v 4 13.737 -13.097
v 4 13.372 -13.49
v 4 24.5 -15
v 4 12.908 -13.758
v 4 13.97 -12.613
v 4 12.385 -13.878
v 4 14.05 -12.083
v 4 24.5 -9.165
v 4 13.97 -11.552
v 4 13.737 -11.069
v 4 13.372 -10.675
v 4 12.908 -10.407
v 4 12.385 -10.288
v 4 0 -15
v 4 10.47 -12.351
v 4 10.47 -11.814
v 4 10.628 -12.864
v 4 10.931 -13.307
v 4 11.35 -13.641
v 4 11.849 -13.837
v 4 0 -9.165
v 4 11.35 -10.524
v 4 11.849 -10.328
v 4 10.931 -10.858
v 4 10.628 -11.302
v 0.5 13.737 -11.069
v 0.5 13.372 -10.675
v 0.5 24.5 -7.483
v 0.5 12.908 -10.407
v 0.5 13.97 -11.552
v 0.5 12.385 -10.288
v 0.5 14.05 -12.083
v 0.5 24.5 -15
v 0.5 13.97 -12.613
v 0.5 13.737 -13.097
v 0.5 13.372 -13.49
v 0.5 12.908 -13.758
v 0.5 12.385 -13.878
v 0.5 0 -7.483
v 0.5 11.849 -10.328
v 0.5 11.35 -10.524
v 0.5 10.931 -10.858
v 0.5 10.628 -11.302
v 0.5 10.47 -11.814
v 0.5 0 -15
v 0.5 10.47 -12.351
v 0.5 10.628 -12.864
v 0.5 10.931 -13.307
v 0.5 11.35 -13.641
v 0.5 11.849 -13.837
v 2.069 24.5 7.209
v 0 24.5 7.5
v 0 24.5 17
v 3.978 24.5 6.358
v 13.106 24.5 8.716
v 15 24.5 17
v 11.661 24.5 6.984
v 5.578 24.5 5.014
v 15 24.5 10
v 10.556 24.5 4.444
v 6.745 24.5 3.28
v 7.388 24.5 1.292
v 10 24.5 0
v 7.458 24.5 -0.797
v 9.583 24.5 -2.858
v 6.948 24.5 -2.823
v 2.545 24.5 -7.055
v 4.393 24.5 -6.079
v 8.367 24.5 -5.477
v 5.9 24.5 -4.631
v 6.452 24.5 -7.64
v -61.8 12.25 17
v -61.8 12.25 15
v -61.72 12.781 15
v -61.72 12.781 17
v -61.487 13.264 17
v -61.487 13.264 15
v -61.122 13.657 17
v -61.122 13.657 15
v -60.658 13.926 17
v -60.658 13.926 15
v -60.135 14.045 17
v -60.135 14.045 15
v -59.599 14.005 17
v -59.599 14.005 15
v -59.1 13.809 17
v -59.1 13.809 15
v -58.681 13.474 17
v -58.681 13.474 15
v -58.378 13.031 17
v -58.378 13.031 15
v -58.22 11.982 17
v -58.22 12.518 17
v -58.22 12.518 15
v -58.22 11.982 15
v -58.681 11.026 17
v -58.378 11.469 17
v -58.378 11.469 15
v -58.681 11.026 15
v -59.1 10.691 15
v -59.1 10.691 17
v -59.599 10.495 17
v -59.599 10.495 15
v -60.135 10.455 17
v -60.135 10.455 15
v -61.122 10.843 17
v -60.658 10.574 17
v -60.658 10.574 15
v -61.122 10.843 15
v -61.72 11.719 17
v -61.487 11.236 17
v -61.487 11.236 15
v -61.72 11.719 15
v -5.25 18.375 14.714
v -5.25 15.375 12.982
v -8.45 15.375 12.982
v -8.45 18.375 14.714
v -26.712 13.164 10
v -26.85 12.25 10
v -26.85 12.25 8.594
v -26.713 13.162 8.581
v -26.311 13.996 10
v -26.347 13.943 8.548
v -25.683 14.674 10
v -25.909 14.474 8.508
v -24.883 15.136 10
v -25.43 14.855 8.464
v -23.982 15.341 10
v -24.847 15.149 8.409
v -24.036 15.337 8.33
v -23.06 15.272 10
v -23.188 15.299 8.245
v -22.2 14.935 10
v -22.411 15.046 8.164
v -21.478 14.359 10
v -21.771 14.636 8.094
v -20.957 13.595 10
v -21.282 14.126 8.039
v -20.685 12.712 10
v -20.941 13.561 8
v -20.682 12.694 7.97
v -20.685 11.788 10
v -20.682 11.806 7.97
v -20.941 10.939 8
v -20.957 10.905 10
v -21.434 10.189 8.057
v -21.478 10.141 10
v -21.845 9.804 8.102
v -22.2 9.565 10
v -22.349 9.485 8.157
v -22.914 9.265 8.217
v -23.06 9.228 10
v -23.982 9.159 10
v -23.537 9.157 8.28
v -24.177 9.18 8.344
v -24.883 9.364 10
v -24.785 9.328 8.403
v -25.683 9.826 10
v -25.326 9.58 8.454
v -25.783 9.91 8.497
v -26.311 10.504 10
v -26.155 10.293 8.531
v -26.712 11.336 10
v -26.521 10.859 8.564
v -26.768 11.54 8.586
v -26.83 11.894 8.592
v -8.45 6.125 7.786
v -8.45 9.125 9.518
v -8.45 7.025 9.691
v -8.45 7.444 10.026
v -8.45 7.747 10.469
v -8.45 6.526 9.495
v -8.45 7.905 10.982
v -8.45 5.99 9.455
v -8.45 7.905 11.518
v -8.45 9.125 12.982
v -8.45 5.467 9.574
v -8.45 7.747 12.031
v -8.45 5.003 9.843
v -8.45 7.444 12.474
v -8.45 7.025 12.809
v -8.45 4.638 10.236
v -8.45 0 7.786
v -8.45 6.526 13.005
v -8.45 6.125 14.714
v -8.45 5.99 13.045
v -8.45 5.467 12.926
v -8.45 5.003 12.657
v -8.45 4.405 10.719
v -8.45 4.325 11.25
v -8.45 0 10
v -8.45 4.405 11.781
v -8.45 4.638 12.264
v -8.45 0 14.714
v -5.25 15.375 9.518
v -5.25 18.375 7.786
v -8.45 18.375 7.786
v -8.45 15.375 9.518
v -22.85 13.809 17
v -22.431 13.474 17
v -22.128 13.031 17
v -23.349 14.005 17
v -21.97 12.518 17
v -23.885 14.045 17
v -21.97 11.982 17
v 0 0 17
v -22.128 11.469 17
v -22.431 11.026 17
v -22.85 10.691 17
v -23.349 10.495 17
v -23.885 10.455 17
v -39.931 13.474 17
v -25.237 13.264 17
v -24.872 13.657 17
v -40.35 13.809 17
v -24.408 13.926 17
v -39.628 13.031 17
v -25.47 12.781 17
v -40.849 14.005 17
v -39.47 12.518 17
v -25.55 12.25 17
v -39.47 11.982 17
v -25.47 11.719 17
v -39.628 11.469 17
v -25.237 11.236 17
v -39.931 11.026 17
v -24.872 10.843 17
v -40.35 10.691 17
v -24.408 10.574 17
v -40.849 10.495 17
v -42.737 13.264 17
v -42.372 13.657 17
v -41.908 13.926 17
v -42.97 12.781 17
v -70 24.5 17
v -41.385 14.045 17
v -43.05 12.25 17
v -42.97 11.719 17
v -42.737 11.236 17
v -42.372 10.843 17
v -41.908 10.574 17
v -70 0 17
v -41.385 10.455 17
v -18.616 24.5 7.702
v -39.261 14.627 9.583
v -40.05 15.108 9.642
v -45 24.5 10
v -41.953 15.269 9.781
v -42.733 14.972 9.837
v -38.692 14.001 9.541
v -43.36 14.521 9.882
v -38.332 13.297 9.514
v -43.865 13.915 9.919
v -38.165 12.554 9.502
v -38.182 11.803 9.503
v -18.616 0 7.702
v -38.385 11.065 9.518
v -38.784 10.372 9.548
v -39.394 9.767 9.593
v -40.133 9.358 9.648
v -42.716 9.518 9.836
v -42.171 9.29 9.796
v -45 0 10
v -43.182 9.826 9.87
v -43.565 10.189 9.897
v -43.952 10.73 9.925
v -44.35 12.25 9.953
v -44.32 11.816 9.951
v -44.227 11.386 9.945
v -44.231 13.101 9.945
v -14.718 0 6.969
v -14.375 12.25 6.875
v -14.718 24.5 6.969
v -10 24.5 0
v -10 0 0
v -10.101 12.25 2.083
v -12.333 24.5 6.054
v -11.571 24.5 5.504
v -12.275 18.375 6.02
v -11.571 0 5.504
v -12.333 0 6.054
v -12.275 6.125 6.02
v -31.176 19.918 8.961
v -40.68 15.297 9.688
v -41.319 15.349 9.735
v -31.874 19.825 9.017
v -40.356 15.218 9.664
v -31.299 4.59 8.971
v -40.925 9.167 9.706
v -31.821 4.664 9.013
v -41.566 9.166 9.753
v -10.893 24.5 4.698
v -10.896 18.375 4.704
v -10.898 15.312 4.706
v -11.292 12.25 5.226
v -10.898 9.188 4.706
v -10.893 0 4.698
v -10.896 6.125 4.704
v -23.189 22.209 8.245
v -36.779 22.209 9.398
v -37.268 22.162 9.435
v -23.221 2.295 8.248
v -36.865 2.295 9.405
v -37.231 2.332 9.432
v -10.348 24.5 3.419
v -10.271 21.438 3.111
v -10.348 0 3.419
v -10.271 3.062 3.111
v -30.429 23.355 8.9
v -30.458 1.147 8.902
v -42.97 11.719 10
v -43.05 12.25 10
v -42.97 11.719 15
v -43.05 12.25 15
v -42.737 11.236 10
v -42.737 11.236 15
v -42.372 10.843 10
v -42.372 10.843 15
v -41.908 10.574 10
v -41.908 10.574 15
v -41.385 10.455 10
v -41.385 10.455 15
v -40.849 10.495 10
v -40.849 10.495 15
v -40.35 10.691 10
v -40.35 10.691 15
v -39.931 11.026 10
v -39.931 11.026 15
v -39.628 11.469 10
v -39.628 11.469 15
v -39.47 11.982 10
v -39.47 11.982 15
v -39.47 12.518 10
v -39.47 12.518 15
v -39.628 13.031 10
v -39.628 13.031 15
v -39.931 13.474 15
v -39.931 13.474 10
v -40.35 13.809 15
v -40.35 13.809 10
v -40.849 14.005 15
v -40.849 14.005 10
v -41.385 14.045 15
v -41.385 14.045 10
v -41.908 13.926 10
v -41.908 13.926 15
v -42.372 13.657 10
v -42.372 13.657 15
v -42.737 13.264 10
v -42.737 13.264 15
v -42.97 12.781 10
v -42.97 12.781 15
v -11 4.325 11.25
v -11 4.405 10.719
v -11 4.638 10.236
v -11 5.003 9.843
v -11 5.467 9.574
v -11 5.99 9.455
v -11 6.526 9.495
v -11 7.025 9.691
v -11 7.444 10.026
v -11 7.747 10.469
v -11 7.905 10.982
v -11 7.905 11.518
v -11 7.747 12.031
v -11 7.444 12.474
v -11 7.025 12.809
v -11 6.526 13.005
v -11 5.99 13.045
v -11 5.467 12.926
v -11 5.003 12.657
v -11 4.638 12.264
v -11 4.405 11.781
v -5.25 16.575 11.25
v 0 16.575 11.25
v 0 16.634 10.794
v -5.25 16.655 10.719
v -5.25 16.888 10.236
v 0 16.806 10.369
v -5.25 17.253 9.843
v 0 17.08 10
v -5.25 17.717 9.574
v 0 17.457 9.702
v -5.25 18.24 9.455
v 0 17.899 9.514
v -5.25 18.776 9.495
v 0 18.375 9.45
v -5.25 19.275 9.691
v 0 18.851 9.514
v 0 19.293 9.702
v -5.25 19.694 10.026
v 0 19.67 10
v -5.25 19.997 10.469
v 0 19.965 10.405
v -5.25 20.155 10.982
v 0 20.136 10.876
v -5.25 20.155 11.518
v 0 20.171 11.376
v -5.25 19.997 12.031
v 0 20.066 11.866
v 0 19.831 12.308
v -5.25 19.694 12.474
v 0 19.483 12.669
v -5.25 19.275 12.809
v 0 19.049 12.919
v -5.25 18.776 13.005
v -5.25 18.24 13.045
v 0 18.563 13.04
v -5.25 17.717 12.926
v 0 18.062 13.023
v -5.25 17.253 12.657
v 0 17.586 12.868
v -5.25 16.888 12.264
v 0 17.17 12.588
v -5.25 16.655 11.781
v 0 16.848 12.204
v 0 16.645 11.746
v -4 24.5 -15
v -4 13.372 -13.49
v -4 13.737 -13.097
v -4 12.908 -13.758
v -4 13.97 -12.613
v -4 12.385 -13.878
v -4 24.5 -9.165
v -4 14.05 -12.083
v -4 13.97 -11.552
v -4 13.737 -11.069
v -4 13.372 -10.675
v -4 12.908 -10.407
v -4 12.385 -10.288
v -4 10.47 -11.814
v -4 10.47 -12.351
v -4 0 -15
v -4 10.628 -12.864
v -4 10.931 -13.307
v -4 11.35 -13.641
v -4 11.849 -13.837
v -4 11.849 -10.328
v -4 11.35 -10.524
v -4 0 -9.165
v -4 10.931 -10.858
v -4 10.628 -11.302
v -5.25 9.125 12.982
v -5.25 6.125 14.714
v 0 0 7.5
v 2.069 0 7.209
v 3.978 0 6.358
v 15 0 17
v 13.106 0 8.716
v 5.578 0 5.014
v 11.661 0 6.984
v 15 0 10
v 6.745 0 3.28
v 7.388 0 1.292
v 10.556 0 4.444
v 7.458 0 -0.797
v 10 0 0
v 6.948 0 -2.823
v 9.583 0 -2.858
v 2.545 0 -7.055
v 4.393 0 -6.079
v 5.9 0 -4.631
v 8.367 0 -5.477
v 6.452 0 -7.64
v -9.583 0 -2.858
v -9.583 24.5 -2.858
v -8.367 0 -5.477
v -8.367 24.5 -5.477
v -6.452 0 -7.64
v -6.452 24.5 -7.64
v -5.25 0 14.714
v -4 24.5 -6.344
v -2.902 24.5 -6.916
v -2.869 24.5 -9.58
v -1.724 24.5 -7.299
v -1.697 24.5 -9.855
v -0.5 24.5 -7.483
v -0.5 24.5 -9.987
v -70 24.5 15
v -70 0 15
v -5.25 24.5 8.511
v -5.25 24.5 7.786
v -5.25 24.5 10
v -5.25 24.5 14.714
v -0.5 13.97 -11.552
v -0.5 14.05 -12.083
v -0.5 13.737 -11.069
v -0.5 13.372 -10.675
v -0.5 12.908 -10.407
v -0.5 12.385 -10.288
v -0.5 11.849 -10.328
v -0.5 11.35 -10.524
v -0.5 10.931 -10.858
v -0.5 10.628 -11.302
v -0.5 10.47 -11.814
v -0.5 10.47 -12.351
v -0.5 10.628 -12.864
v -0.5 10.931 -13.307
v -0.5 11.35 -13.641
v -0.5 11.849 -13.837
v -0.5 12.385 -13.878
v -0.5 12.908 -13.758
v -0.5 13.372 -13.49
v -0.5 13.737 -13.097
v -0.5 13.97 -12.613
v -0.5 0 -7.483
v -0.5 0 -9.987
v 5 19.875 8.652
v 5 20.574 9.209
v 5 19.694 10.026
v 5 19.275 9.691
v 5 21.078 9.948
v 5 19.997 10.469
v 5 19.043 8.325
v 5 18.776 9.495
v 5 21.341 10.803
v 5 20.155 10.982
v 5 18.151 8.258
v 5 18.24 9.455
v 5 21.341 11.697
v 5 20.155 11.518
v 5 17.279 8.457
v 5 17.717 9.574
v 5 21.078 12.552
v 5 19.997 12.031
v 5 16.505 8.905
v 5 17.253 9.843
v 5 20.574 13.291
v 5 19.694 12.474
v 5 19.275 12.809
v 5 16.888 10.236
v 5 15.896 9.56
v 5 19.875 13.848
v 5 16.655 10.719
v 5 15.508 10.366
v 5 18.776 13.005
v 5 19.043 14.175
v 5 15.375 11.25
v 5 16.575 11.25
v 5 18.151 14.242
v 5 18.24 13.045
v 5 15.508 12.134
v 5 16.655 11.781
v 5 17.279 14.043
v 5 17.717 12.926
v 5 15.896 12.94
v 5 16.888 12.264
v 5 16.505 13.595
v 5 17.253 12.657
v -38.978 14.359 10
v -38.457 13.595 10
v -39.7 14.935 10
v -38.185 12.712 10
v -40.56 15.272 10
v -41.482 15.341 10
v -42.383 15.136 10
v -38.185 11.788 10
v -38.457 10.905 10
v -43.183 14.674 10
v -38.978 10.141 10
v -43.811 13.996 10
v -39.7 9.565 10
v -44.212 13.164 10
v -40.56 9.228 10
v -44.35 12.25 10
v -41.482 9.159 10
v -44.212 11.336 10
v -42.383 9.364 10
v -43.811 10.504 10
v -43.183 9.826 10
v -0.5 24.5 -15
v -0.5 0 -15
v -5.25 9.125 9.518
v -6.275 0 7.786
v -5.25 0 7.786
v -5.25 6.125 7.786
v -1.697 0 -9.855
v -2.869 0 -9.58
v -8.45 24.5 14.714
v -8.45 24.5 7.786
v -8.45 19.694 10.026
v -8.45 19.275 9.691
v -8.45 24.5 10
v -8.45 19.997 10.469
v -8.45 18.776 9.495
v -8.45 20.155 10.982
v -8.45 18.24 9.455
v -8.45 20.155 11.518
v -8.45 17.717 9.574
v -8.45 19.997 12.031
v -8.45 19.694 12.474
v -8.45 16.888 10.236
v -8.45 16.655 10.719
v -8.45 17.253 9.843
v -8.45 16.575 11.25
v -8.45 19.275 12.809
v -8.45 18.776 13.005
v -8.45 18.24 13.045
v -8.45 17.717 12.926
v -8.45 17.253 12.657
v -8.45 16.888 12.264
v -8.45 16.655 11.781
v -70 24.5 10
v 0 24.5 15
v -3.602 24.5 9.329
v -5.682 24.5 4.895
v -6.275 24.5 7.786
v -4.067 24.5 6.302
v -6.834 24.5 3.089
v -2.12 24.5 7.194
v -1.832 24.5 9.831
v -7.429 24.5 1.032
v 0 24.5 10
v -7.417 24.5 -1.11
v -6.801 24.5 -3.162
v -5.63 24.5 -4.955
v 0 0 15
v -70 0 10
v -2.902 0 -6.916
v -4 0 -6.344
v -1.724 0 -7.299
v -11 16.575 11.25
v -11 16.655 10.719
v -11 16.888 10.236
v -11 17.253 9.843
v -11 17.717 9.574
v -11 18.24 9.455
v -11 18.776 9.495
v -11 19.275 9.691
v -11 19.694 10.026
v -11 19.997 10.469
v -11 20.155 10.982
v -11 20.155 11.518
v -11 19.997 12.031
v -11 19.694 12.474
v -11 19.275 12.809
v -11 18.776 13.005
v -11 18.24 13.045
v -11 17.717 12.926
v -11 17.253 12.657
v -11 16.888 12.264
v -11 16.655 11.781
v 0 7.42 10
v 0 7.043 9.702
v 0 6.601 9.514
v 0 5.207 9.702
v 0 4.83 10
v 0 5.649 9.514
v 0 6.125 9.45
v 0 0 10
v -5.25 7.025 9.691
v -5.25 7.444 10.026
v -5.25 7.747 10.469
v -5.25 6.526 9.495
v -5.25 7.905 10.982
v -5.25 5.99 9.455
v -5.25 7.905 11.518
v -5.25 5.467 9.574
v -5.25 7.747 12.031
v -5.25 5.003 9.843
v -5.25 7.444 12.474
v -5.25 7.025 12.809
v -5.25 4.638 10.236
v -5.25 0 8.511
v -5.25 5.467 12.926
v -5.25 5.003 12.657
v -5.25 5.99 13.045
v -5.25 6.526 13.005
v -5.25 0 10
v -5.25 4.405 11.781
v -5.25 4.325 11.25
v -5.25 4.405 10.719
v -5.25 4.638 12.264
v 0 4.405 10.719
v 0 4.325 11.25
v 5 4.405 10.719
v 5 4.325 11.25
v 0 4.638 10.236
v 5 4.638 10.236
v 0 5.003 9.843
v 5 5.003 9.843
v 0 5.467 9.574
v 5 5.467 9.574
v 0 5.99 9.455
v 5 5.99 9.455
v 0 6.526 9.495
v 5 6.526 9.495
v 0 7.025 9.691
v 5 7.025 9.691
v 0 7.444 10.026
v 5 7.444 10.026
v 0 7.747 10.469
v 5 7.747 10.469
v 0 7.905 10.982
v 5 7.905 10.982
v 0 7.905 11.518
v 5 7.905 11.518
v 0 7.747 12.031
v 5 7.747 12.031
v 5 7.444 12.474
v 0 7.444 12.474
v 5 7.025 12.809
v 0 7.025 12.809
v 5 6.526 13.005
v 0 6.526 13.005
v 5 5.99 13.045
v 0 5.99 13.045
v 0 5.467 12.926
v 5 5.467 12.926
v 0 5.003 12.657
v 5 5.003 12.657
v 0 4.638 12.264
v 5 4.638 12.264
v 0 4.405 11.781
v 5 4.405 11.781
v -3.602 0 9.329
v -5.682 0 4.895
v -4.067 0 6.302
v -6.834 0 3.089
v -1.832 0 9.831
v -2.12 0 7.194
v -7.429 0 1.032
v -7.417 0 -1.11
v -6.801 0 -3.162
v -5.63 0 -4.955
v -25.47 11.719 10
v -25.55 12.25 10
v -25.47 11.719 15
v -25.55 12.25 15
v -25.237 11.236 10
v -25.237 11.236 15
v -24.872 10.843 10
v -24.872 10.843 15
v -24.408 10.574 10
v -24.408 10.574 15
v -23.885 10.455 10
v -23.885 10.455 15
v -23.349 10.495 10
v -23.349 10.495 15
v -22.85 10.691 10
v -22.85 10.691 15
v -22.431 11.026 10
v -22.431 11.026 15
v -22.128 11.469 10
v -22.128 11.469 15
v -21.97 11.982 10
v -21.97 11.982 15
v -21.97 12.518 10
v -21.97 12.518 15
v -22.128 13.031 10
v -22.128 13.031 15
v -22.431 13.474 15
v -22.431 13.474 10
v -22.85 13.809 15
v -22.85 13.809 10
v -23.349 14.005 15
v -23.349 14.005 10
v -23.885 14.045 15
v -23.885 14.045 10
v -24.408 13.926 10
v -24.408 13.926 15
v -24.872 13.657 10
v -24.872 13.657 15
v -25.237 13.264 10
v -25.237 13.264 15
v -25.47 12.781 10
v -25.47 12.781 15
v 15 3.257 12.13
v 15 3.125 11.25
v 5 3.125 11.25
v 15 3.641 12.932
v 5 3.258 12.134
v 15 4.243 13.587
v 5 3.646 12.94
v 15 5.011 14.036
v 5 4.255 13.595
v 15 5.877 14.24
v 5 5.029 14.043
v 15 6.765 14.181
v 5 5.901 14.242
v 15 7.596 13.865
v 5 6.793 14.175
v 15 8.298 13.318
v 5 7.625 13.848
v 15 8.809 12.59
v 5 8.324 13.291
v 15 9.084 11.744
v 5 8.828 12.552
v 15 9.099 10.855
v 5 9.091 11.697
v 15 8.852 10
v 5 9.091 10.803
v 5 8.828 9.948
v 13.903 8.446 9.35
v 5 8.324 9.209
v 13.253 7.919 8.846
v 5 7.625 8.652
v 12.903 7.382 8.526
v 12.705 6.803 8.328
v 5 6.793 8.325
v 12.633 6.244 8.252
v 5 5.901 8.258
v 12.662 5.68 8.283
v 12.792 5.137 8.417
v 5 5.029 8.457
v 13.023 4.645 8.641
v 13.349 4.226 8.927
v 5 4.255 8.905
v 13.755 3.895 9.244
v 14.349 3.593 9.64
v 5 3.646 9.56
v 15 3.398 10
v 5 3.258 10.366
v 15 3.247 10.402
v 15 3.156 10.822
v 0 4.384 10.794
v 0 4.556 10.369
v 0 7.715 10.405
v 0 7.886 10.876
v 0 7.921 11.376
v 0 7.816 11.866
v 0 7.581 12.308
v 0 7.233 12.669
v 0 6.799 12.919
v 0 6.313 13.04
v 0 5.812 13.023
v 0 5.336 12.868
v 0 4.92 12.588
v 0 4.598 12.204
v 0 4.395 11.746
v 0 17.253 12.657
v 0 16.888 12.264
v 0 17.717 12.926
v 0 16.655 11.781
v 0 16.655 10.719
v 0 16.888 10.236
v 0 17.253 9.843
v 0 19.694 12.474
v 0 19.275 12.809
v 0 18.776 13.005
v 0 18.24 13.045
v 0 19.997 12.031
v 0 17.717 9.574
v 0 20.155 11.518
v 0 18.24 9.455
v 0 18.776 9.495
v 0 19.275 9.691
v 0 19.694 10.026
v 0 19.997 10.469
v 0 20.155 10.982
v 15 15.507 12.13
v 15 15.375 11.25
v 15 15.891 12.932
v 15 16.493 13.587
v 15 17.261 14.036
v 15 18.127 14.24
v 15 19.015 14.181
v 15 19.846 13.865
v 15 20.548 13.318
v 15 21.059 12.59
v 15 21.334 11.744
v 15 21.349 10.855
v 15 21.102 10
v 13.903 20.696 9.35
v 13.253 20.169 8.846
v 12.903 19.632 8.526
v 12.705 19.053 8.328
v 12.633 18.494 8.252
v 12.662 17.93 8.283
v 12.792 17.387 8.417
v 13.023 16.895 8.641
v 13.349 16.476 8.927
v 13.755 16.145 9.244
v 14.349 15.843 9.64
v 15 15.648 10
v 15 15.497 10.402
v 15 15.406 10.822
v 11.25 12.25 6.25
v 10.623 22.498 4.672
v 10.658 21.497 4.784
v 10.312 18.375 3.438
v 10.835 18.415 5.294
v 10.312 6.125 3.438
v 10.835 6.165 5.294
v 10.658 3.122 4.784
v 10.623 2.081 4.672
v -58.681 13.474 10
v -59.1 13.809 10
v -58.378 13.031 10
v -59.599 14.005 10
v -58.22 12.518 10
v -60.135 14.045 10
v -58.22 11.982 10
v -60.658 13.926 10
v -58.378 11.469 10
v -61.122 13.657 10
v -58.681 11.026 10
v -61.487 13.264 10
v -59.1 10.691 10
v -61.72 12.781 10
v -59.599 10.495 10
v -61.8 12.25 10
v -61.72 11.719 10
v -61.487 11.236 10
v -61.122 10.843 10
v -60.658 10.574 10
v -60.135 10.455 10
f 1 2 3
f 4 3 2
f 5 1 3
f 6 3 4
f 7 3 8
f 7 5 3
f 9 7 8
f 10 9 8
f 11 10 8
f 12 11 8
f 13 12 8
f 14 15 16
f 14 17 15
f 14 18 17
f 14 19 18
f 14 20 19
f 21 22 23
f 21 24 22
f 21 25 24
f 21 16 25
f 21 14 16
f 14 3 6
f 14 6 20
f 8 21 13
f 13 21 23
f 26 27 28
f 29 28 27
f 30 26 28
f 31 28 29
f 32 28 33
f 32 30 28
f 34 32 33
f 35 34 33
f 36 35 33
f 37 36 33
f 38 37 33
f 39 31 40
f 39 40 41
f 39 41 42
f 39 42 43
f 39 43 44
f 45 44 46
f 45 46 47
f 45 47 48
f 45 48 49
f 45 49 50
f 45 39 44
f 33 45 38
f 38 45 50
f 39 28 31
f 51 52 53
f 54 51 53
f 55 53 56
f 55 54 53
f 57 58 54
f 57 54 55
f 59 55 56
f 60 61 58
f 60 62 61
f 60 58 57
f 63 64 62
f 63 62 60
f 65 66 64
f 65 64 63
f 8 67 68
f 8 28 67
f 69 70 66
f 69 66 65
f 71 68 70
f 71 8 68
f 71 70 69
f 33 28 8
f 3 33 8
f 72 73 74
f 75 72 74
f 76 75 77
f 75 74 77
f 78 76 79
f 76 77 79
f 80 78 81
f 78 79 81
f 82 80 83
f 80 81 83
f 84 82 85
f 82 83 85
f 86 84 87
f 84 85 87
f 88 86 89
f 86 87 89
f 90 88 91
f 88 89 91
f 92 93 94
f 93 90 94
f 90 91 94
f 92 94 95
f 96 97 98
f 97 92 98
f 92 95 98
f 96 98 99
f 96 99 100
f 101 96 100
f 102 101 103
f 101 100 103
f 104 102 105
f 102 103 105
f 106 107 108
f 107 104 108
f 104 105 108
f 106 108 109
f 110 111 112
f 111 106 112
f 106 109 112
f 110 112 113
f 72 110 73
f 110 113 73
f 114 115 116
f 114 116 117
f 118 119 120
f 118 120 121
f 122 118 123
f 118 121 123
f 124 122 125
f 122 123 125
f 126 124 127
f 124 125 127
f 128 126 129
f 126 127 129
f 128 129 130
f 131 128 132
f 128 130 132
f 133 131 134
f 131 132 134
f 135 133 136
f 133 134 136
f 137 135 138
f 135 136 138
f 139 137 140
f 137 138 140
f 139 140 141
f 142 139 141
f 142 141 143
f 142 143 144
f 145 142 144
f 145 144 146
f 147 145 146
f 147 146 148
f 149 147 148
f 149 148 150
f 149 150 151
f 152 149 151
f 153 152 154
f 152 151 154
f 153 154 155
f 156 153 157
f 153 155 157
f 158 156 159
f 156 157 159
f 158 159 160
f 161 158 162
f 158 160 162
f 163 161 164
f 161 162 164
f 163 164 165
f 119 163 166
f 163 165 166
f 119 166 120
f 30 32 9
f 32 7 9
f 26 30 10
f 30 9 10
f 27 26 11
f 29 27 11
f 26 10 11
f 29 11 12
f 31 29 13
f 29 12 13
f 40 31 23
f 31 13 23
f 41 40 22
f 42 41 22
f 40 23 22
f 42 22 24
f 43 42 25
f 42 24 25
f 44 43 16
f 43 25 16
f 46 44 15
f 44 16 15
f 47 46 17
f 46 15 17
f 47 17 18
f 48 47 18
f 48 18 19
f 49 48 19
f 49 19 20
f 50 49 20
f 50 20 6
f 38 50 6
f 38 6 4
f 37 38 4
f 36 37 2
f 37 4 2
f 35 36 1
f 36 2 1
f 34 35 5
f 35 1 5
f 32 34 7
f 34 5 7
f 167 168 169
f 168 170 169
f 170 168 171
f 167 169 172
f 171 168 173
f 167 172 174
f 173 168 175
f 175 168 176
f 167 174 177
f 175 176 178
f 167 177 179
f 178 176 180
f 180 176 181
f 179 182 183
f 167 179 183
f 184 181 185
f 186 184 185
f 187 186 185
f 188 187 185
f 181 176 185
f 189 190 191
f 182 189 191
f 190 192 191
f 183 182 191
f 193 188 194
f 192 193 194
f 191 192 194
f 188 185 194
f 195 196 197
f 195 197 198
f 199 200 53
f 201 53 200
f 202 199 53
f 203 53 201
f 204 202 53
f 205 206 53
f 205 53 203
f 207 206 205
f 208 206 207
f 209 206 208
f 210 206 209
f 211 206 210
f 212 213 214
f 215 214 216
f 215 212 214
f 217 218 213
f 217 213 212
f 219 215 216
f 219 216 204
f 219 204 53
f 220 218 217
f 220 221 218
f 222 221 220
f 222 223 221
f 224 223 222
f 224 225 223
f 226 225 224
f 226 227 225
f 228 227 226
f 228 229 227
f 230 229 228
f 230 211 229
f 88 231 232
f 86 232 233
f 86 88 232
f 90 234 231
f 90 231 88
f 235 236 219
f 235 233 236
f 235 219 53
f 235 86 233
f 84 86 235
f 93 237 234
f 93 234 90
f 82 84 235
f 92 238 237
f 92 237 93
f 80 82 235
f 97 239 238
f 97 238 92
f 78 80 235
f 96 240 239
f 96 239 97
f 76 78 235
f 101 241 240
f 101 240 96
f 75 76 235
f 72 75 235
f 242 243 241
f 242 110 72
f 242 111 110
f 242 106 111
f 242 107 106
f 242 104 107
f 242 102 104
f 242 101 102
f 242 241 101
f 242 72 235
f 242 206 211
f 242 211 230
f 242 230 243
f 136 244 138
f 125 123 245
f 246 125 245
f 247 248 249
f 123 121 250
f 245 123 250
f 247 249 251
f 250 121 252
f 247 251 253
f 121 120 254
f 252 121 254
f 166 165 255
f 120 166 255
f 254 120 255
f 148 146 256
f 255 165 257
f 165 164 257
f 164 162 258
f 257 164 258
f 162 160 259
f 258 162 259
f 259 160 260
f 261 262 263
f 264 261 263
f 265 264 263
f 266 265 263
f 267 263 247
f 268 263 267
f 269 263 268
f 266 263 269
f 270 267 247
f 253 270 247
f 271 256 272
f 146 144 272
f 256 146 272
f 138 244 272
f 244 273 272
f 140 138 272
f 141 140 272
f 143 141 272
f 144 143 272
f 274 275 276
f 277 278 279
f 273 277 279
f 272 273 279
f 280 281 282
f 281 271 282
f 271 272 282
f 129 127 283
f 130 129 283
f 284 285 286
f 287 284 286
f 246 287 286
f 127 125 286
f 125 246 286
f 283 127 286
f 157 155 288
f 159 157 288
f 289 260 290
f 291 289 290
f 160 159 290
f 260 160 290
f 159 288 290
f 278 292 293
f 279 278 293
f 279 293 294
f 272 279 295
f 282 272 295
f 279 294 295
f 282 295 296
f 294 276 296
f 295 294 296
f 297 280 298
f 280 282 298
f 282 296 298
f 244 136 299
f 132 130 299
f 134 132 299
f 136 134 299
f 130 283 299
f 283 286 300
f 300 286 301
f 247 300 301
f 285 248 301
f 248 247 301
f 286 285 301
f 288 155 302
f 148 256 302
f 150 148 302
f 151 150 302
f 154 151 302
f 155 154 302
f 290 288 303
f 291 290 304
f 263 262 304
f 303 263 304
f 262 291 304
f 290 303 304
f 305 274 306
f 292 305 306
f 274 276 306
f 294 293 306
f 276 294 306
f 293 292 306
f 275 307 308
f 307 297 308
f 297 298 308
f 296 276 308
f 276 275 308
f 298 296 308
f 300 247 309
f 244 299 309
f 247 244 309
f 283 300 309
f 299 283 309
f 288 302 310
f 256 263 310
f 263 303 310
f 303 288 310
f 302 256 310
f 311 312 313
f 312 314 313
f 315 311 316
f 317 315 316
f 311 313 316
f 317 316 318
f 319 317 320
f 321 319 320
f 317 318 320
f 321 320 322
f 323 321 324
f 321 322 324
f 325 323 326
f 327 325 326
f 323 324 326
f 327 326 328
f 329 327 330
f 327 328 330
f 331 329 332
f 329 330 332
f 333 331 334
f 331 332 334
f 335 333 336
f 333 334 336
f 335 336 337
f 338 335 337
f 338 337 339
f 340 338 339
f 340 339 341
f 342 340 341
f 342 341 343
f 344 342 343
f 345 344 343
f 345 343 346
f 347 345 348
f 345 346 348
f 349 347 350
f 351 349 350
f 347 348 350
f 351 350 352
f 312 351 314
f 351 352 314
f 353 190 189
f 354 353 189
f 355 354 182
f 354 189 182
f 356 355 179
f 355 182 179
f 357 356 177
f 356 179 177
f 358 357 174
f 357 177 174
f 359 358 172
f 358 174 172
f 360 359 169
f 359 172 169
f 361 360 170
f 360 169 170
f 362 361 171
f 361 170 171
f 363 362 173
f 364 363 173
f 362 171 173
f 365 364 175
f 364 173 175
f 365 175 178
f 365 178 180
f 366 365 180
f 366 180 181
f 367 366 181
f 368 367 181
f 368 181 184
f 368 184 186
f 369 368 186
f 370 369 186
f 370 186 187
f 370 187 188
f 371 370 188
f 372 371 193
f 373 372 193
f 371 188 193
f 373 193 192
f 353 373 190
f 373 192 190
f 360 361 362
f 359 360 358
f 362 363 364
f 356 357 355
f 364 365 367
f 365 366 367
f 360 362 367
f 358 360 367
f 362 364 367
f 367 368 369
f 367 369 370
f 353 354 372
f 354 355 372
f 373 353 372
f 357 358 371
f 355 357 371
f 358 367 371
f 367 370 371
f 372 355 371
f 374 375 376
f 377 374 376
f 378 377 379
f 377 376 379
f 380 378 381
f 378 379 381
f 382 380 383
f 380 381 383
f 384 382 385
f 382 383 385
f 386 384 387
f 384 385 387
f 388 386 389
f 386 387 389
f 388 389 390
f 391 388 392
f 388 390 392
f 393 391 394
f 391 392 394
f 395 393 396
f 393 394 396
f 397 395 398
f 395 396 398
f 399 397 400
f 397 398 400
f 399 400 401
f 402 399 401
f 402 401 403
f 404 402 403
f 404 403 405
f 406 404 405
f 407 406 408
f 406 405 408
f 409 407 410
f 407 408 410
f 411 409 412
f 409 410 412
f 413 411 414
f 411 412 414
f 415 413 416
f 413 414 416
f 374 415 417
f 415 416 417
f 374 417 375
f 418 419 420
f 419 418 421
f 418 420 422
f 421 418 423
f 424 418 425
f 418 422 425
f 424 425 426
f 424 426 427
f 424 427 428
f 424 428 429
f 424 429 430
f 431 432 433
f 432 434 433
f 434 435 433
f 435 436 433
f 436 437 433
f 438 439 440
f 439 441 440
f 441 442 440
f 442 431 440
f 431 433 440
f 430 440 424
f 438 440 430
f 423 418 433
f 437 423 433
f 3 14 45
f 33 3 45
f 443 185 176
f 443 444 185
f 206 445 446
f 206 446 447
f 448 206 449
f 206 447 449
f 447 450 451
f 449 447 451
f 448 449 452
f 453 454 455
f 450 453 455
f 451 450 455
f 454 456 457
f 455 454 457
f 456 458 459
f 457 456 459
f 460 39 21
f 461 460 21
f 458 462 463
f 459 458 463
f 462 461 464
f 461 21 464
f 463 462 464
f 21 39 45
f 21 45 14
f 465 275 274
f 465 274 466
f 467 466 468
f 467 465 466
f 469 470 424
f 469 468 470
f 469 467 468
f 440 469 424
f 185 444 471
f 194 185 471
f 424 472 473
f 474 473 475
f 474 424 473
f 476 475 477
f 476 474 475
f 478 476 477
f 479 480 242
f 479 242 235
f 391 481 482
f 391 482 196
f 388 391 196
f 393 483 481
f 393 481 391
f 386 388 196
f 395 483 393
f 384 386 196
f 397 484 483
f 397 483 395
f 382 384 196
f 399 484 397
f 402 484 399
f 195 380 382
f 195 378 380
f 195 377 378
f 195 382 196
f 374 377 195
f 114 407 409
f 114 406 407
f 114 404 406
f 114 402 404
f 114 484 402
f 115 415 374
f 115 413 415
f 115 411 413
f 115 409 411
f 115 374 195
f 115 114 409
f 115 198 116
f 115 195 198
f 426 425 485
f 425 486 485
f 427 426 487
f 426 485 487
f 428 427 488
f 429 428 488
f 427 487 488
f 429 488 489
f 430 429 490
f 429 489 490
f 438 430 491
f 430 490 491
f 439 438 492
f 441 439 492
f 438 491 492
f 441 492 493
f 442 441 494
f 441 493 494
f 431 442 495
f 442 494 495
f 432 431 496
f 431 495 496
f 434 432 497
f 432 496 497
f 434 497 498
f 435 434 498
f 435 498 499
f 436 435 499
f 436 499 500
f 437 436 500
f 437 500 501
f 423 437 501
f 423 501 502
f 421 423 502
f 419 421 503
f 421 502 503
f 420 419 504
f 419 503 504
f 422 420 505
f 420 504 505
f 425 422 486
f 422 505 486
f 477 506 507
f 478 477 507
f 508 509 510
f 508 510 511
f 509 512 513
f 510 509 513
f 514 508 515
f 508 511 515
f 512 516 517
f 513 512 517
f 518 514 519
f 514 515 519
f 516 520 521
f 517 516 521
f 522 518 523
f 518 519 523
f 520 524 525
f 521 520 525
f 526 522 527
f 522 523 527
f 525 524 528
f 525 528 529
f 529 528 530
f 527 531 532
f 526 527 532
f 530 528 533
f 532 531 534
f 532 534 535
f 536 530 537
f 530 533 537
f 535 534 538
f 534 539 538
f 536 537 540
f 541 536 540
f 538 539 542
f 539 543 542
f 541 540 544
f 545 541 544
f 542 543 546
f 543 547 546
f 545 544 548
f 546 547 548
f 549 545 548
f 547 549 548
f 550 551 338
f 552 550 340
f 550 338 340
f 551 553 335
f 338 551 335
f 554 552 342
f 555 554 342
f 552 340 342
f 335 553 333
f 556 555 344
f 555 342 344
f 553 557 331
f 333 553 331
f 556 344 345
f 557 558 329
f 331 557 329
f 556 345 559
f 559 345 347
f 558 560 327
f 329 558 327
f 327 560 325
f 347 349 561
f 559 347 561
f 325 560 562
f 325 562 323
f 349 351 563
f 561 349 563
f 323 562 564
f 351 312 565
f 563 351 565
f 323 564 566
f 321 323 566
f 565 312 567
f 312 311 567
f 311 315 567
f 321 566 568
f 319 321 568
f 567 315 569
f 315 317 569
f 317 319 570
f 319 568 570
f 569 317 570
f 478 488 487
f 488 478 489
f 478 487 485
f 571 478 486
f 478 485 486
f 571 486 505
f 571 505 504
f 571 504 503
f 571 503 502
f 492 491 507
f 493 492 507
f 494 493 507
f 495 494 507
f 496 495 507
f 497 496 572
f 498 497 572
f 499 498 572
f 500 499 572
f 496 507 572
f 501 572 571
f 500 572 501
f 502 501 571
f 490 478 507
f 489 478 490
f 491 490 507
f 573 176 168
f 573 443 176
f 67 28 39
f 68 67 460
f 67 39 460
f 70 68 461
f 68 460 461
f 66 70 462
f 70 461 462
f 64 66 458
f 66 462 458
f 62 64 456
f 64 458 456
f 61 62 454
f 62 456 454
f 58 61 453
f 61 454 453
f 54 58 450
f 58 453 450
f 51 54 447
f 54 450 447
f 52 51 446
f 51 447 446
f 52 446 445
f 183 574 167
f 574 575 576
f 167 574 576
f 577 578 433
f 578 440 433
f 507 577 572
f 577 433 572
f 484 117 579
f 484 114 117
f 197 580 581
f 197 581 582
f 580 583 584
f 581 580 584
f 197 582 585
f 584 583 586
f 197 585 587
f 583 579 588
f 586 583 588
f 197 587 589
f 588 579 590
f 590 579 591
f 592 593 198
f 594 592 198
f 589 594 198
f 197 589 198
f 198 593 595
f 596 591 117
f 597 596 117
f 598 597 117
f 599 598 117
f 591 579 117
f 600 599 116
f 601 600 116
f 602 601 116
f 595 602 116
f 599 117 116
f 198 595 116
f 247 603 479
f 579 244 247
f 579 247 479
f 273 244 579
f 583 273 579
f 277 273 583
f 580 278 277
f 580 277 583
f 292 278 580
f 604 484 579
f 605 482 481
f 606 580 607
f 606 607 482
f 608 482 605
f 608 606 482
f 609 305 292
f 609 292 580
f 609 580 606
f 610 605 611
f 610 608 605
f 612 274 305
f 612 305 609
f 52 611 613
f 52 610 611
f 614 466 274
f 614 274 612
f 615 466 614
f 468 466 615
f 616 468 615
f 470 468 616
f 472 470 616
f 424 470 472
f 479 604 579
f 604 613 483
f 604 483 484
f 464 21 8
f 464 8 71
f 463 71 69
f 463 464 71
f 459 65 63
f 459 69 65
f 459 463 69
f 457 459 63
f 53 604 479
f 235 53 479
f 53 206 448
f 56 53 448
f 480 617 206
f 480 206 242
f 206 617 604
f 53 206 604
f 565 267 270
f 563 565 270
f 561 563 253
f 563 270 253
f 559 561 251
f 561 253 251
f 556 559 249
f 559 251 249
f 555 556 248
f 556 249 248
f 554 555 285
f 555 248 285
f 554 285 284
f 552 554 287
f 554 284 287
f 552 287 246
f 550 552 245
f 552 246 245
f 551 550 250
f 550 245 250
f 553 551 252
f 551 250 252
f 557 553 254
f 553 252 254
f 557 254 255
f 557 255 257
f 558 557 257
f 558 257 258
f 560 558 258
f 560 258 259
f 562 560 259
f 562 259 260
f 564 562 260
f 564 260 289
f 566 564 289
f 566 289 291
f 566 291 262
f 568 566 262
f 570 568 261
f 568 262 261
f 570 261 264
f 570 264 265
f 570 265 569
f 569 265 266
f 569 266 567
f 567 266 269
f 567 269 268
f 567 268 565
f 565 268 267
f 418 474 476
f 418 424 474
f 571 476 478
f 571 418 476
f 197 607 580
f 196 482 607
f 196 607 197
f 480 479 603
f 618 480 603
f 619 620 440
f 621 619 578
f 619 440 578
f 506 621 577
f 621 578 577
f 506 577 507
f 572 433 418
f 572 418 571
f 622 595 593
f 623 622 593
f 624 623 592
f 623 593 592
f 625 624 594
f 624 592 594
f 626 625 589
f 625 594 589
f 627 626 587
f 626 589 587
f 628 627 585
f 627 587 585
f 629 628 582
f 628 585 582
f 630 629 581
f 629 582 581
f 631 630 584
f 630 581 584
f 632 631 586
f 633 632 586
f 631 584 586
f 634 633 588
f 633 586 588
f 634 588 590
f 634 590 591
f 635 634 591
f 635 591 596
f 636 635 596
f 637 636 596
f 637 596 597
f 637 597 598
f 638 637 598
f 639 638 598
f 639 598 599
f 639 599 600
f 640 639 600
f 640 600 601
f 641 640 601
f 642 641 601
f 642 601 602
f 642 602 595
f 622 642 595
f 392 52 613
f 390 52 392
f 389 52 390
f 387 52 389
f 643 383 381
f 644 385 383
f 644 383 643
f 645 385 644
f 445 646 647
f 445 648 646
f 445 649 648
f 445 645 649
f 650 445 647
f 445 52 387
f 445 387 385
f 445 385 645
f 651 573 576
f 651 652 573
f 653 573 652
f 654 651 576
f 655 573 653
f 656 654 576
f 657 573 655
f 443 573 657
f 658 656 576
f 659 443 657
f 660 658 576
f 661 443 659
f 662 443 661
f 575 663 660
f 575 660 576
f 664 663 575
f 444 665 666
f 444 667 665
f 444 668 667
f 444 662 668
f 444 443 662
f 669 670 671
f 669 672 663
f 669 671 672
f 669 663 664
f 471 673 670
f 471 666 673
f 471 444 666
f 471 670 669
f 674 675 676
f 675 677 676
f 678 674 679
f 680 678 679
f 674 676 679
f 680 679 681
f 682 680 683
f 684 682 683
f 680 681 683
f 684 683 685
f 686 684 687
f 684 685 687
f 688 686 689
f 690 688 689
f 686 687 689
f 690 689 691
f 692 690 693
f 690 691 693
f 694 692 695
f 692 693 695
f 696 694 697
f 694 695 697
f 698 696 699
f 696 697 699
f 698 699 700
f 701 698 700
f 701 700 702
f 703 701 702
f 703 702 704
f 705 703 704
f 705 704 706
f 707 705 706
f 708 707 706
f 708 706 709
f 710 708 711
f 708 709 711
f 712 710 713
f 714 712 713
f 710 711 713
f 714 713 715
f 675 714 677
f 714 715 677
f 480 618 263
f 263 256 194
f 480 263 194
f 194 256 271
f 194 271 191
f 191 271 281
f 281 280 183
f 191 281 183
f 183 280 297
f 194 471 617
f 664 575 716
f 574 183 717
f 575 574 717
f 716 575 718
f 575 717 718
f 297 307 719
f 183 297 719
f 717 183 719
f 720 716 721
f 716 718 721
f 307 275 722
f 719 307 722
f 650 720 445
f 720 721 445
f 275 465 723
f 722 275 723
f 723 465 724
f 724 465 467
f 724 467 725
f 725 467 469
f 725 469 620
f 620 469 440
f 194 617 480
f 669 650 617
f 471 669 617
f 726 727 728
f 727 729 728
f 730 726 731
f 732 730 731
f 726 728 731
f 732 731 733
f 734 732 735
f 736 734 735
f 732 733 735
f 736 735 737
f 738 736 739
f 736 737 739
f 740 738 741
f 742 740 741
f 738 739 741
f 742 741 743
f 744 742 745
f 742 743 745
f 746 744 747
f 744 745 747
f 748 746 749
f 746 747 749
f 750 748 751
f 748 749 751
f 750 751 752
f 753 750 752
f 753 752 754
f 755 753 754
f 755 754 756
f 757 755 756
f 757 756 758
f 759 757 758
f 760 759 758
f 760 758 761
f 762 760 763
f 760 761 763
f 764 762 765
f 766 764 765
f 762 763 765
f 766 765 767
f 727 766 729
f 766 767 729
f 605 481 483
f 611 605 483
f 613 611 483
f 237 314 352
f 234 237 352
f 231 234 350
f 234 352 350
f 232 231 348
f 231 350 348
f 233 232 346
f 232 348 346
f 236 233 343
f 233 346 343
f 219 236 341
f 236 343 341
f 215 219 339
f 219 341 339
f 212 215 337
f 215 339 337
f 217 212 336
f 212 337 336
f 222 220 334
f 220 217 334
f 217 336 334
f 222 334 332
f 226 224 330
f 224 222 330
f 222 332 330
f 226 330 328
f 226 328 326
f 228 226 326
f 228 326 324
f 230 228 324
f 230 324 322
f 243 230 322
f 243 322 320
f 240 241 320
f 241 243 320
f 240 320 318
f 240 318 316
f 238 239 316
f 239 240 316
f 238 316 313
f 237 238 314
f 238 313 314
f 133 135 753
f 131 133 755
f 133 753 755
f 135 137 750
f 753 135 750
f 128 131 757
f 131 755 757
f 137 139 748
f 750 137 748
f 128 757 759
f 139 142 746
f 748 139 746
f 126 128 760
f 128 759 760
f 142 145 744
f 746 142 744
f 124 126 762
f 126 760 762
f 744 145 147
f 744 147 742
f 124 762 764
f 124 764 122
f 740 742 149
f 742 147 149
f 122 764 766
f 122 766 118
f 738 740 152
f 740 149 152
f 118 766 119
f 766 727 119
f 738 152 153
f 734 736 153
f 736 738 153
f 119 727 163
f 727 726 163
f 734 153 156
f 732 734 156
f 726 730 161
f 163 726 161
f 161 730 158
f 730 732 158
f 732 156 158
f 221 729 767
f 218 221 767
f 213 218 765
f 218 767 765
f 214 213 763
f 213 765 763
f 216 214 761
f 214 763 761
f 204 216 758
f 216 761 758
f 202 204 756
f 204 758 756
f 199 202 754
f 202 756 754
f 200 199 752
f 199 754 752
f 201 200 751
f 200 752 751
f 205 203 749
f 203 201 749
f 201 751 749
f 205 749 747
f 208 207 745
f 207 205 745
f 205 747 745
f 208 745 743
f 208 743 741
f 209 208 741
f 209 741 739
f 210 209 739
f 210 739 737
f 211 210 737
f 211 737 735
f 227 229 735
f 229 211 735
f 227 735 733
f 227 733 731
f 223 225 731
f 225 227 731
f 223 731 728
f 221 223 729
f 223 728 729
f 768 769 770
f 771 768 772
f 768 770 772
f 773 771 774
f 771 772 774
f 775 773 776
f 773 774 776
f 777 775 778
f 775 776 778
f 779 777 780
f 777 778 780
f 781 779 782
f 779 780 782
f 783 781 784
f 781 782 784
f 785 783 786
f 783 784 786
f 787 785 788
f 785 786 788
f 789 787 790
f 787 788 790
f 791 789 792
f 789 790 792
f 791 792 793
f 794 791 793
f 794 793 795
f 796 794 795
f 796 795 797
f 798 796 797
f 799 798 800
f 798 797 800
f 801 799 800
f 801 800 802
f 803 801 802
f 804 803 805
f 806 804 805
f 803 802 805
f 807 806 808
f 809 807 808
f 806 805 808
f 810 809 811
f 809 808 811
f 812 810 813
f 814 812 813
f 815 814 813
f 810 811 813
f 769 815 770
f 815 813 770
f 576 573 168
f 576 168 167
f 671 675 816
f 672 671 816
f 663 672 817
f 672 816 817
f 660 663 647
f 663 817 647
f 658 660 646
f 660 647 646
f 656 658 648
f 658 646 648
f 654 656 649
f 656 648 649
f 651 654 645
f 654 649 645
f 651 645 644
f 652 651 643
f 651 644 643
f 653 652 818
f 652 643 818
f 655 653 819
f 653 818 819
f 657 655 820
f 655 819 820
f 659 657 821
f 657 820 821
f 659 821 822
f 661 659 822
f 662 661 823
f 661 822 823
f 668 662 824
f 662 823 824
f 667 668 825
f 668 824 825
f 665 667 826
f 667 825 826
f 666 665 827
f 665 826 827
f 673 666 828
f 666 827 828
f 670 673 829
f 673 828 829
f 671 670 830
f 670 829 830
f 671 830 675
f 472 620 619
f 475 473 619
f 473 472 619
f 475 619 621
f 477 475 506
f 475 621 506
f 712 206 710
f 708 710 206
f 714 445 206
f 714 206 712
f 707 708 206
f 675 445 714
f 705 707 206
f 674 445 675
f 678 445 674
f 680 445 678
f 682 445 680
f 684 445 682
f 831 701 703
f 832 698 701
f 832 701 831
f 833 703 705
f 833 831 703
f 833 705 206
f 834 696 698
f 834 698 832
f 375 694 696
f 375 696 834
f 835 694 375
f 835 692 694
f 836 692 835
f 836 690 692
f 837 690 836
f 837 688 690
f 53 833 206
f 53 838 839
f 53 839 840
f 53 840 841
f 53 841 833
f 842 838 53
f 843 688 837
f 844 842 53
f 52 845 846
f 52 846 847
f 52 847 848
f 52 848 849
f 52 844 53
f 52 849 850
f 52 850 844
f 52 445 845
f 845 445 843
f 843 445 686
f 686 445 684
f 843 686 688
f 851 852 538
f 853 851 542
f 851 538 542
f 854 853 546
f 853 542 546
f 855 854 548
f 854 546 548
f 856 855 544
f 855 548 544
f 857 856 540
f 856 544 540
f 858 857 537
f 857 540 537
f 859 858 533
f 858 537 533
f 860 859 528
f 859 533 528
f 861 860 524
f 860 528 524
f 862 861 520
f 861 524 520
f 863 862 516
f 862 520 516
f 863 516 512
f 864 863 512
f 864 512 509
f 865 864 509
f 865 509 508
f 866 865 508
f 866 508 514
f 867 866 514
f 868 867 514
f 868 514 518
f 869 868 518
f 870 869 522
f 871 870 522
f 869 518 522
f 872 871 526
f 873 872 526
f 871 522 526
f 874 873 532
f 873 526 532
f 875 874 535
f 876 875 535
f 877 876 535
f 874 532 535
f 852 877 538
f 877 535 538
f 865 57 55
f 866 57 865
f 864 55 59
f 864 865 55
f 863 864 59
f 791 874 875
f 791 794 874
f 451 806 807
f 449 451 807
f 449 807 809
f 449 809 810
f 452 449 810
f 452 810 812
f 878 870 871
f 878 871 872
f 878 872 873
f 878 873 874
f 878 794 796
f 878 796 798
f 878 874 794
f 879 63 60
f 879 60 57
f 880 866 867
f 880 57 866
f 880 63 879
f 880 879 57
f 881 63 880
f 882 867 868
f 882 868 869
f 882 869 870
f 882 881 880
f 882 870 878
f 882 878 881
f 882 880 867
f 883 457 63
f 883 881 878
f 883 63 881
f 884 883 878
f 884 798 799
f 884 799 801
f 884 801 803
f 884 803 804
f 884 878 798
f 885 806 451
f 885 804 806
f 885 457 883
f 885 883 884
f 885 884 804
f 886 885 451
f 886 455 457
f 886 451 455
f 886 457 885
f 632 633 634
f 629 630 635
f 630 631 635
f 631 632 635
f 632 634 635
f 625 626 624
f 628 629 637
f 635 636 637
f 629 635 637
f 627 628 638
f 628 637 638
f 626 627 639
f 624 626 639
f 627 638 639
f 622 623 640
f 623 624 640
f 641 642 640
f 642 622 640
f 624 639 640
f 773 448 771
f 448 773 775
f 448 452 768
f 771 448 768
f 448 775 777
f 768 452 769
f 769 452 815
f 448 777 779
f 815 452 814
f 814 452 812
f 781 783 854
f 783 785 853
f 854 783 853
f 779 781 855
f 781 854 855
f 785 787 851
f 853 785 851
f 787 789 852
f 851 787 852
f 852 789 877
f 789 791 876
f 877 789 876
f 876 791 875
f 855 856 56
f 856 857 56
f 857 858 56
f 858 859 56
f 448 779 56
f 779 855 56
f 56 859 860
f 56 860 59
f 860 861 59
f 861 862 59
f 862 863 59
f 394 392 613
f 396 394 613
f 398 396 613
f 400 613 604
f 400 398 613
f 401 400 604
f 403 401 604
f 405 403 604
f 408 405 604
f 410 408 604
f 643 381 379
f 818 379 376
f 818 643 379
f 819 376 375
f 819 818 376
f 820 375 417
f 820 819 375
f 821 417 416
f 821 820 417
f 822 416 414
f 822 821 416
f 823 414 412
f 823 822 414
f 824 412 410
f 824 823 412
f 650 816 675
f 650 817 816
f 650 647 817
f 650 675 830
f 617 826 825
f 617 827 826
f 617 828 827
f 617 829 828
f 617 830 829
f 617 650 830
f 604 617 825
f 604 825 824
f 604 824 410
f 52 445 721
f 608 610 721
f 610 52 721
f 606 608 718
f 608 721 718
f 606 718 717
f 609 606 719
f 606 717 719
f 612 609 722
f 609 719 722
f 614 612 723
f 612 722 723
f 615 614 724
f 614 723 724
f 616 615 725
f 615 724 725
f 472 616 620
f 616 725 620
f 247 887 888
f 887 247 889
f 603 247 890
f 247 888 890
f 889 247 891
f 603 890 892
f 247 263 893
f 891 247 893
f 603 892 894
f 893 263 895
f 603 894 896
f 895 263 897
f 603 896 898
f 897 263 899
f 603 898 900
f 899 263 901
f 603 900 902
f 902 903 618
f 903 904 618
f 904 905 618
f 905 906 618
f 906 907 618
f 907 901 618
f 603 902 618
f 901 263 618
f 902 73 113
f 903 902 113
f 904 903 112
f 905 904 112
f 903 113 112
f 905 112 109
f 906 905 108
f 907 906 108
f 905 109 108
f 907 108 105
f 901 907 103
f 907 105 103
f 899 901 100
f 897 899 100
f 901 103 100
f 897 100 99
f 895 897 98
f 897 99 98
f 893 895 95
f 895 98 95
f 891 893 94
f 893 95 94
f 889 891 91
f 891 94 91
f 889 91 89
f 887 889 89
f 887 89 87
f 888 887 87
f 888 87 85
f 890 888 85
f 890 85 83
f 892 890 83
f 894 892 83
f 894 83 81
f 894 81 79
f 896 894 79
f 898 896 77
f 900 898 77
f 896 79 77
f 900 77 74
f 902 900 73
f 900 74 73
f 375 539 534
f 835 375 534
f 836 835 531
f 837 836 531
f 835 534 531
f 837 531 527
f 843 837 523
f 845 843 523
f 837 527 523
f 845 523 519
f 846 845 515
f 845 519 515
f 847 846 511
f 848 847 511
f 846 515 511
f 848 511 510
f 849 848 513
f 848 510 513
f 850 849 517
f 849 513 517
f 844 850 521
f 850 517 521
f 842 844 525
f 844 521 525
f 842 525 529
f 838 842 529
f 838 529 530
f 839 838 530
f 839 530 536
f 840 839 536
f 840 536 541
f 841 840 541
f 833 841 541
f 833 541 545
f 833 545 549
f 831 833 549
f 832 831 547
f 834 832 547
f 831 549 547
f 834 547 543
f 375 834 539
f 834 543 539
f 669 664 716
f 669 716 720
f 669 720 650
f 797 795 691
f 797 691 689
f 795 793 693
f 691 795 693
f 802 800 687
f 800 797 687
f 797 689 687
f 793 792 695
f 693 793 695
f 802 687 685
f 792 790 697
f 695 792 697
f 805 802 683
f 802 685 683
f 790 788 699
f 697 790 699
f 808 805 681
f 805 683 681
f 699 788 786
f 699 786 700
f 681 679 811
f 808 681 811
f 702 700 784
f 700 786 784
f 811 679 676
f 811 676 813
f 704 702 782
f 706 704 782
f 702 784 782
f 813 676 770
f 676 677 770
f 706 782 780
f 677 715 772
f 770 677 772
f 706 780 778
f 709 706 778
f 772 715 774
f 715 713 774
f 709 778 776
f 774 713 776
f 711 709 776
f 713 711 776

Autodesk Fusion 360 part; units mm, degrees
sketch "front" plane through (0, 0, 0) normal (0, 1, 0) x (1, 0, 0) in component "bearing-holder"
  circle A0 centre (0, 0) radius 7.5
  line L0 (0, 0) -> (0, -15) construction
  line L1 (0, -15) -> (-70, -15)
  line L2 (-70, -15) -> (-70, 15)
  line L3 (-70, 15) -> (0, 15)
  line L4 (0, 15) -> (0, -15)
  line L5 (-70, -15) -> (0, -15)
  line L6 (0, -15) -> (0, -10)
  line L7 (0, -10) -> (-70, -10)
  line L8 (-70, -10) -> (-70, -15)
  circle A1 centre (0, 0) radius 10
  line L9 (-35, -10) -> (-45, -10) construction
  line L10 (0, 0) -> (-10, 0) construction
  line L11 (-10, 0) -> (-10, -7.5) construction
  spline S0 degree 2 poles (-10, 0) (-10, -7.5) (-45, -10) knots 0 0 0 3.893303 3.893303 3.893303 weights 1 3 1
  line L12 (0, 0) -> (-4, 0) construction
  line L13 (-4, 0) -> (-4, 15) construction
  line L14 (-4, 15) -> (0, 15) construction
  line L15 (0, 15) -> (0, 0) construction
  line L16 (0, 0) -> (-0.5, 0) construction
  line L17 (-0.5, 0) -> (-0.5, 15) construction
  line L18 (-0.5, 15) -> (0, 15) construction
  line L19 (0, 15) -> (0, 0) construction
  line L20 (-4, 6.3443) -> (-0.5, 6.3443)
  line L21 (-0.5, 6.3443) -> (-0.5, 15)
  line L22 (-0.5, 15) -> (-4, 15)
  line L23 (-4, 15) -> (-4, 6.3443)
  line L24 (0, -15) -> (15, -15)
  line L25 (15, -15) -> (15, 15)
  line L26 (15, 15) -> (0, 15)
  line L27 (0, 15) -> (0, -15)
  line L28 (0, 0) -> (0.5, 0) construction
  line L29 (0, 0) -> (4, 0) construction
  line L30 (0.5, 0) -> (4, 0) construction
  line L31 (4, 0) -> (4, 15) construction
  line L32 (4, 15) -> (0.5, 15) construction
  line L33 (0.5, 15) -> (0.5, 0) construction
  line L34 (4, 6.3443) -> (0.5, 6.3443)
  line L35 (0.5, 6.3443) -> (0.5, 15)
  line L36 (0.5, 15) -> (4, 15)
  line L37 (4, 15) -> (4, 6.3443)
  line L38 (0, -10) -> (15, -10) construction
  line L39 (0, 0) -> (10, 0) construction
  line L40 (10, 0) -> (10, -7.5) construction
  spline S1 degree 2 poles (10, 0) (10, -7.5) (15, -10) knots 0 0 0 1.167708 1.167708 1.167708
  dimension "d1" = 15
  dimension "d2" = 15
  dimension "d3" = 70
  dimension "d4" = 30
  dimension "d5" = 70
  dimension "d6" = 5
  dimension "d7" = 20
  dimension "d8" = 10
  dimension "d9" = 7.5
  dimension "d11" = 4
  dimension "d12" = 15
  dimension "d13" = 0.5
  dimension "d16" = 15
  dimension "d17" = 30
  dimension "d18" = 0.5
  dimension "d19" = 4
  dimension "d20" = 7.5
extrude "Extrude1" add sketch "front" along normal blind 24.5 contours A0 L4 A1 L23 L27 | A0 A1 L21 L23 | L1 L2 L4 L5 L6 L7 L8 L27 | L7 A1 S0 | L3 A1 L21 L22 L23 makes body 1 in component "bearing-holder"
extrude "Extrude2" add sketch "front" along normal blind 24.5 separate body contours A0 L4 A1 L27 L37 | A0 A1 L35 L37 | A1 L26 L35 L36 L37 | L4 L6 A1 L24 L25 L27 S1 makes body 2 in component "bearing-holder"
sketch "bottom-screws" plane through (4, 0, 0) normal (1, 0, 0) x (0, 1, 0) in component "bearing-holder"
  line L0 (0, -9.1652) -> (0, -15)
  line L1 (0, -15) -> (24.5, -15)
  line L2 (24.5, -15) -> (24.5, -9.1652)
  line L3 (24.5, -9.1652) -> (0, -9.1652)
  line L4 (0, -9.1652) -> (24.5, -15) construction
  line L5 (24.5, -9.1652) -> (0, -15) construction
  line L6 (12.25, -9.1652) -> (12.25, -15) construction
  line L7 (0, -9.1652) -> (12.25, -15) construction
  line L8 (12.25, -9.1652) -> (0, -15) construction
  line L9 (12.25, -9.1652) -> (24.5, -15) construction
  line L10 (24.5, -9.1652) -> (12.25, -15) construction
  circle A0 centre (6.125, -12.0826) radius 1.8
  circle A1 centre (18.375, -12.0826) radius 1.8
  circle A2 centre (12.25, -12.0826) radius 1.8
  dimension "d24" = 3.6
  dimension "d25" = 3.6
  dimension "d57" = 3.6
sketch "upper-screws" plane through (0, 0, 0) normal (-1, 0, 0) x (0, -1, 0) in component "bearing-holder"
  line L0 (0, 7.5) -> (0, 15)
  line L1 (0, 15) -> (-24.5, 15)
  line L2 (-24.5, 15) -> (-24.5, 7.5)
  line L3 (-24.5, 7.5) -> (0, 7.5)
  line L4 (-24.5, 15) -> (0, 7.5) construction
  line L5 (0, 15) -> (-24.5, 7.5) construction
  line L6 (-12.25, 15) -> (-12.25, 7.5) construction
  line L7 (-24.5, 15) -> (-12.25, 7.5) construction
  line L8 (-12.25, 15) -> (-24.5, 7.5) construction
  line L9 (-12.25, 15) -> (0, 7.5) construction
  line L10 (0, 15) -> (-12.25, 7.5) construction
  circle A0 centre (-18.375, 11.25) radius 3
  circle A1 centre (-6.125, 11.25) radius 3
  circle A2 centre (-18.375, 11.25) radius 1.8
  circle A3 centre (-6.125, 11.25) radius 1.8
  line L11 (-15.375, 12.9821) -> (-18.375, 14.7141)
  line L12 (-18.375, 14.7141) -> (-21.375, 12.9821)
  line L13 (-21.375, 12.9821) -> (-21.375, 9.5179)
  line L14 (-21.375, 9.5179) -> (-18.375, 7.7859)
  line L15 (-18.375, 7.7859) -> (-15.375, 9.5179)
  line L16 (-15.375, 9.5179) -> (-15.375, 12.9821)
  line L17 (-9.125, 9.5179) -> (-6.125, 7.7859)
  line L18 (-6.125, 7.7859) -> (-3.125, 9.5179)
  line L19 (-3.125, 9.5179) -> (-3.125, 12.9821)
  line L20 (-3.125, 12.9821) -> (-6.125, 14.7141)
  line L21 (-6.125, 14.7141) -> (-9.125, 12.9821)
  line L22 (-9.125, 12.9821) -> (-9.125, 9.5179)
  line L23 (-18.375, 14.7141) -> (-24.5, 14.7141)
  line L24 (-24.5, 14.7141) -> (-24.5, 7.7859)
  line L25 (-24.5, 7.7859) -> (-18.375, 7.7859)
  line L26 (-18.375, 7.7859) -> (-18.375, 14.7141)
  line L27 (-6.125, 14.7141) -> (0, 14.7141)
  line L28 (0, 14.7141) -> (0, 7.7859)
  line L29 (0, 7.7859) -> (-6.125, 7.7859)
  line L30 (-6.125, 7.7859) -> (-6.125, 14.7141)
  point P0 (-18.375, 11.25)
  point P1 (-6.125, 11.25)
  dimension "d28" = 6
  dimension "d29" = 6
  dimension "d30" = 3.6
  dimension "d31" = 3.6
  dimension "d52" = 3
  dimension "d53" = 3
extrude "Extrude4" cut sketch "upper-screws" against normal blind 10 from surface at -5 contours A1 A3 L30 | A1 A3 L30 | A3 L30 | A3 L30 | A0 A2 L26 | A0 A2 L26 | A2 L26 | A2 L26 bodies 2 in component "bearing-holder"
extrude "Extrude5" cut sketch "upper-screws" along normal blind 11 and the other way blind 7.5 contours A3 L30 | A3 L30 | A2 L26 | A2 L26 bodies 1 2 in component "bearing-holder"
sketch "plate-mount" plane through (0, 0, 15) normal (0, 0, 1) x (-1, 0, 0) in component "bearing-holder"
  line L0 (70, 0) -> (0, 0)
  line L1 (0, 0) -> (0, -24.5)
  line L2 (0, -24.5) -> (70, -24.5)
  line L3 (70, -24.5) -> (70, 0)
  line L4 (70, -24.5) -> (60, -24.5) construction
  line L5 (60, -24.5) -> (60, 0) construction
  line L6 (60, 0) -> (70, 0) construction
  line L7 (70, 0) -> (70, -24.5) construction
  circle A0 centre (60, -12.25) radius 1.8
  line L8 (60, -24.5) -> (50, -24.5) construction
  line L9 (50, -24.5) -> (15, -24.5) construction
  line L10 (15, -24.5) -> (15, 0) construction
  line L11 (15, 0) -> (50, 0) construction
  line L12 (50, 0) -> (50, -24.5) construction
  line L13 (50, -24.5) -> (32.5, 0) construction
  line L14 (32.5, -24.5) -> (50, 0) construction
  line L15 (32.5, -24.5) -> (15, 0) construction
  line L16 (15, -24.5) -> (32.5, 0) construction
  circle A1 centre (41.25, -12.25) radius 1.8
  circle A2 centre (23.75, -12.25) radius 1.8
  circle A3 centre (41.25, -12.25) radius 3.1
  circle A4 centre (23.75, -12.25) radius 3.1
  dimension "d39" = 10
  dimension "d40" = 3.6
  dimension "d41" = 10
  dimension "d42" = 35
  dimension "d43" = 3.6
  dimension "d44" = 3.6
  dimension "d47" = 6.2
  dimension "d48" = 6.2
extrude "Extrude6" cut sketch "plate-mount" against normal blind 7 contours A0 | A1 | A2 bodies 1 in component "bearing-holder"
extrude "Extrude7" cut sketch "plate-mount" along normal blind 2 from surface at -7 contours A3 | A4 bodies 1 in component "bearing-holder"
extrude "Extrude8" cut sketch "upper-screws" along normal blind 3.2 from surface at 5.25 contours L0 L18 L19 L20 L27 L28 L29 | A1 L18 L30 | A1 L17 L30 | L2 L12 L13 L14 L23 L24 L25 | A1 L21 L30 | A1 L20 L30 | A1 L17 L22 | A1 A3 L30 | A1 A3 L30 | A1 L18 L19 | A0 L15 L26 | A0 L14 L26 | A1 L19 L20 | A1 L21 L22 | A0 L12 L26 | A0 L11 L26 | A0 L13 L14 | A0 A2 L26 | A0 A2 L26 | A0 L15 L16 | A0 L11 L16 | A0 L12 L13 bodies 1 in component "bearing-holder"
extrude "Extrude9" cut sketch "bottom-screws" against normal blind 8 contours A2 bodies 1 2 in component "bearing-holder"
extrude "Extrude10" add 1 faces at (5, 8.1667, 15) along direction (0, 0, 1) blind 2 on bodies 2 bodies 2 in component "bearing-holder"
extrude "Extrude11" add 1 faces at (-7.3167, 12.25, 15) along direction (0, 0, 1) blind 2 on bodies 1 bodies 1 in component "bearing-holder"
delete_face "DeleteFace1" 1 faces at (-20.8872, 12.5465, 8) on bodies 1 in component "bearing-holder"
component "bearing-holder" placed x (1, 0, 0) y (0, 1, 0) z (0, 0, 1) at (0, 0, 0)
equation "d42 = 50 mm - 15 mm"
equation "d54 = ( ( 7.5 / 2 ) * 1 mm ) + 1.5 mm"
